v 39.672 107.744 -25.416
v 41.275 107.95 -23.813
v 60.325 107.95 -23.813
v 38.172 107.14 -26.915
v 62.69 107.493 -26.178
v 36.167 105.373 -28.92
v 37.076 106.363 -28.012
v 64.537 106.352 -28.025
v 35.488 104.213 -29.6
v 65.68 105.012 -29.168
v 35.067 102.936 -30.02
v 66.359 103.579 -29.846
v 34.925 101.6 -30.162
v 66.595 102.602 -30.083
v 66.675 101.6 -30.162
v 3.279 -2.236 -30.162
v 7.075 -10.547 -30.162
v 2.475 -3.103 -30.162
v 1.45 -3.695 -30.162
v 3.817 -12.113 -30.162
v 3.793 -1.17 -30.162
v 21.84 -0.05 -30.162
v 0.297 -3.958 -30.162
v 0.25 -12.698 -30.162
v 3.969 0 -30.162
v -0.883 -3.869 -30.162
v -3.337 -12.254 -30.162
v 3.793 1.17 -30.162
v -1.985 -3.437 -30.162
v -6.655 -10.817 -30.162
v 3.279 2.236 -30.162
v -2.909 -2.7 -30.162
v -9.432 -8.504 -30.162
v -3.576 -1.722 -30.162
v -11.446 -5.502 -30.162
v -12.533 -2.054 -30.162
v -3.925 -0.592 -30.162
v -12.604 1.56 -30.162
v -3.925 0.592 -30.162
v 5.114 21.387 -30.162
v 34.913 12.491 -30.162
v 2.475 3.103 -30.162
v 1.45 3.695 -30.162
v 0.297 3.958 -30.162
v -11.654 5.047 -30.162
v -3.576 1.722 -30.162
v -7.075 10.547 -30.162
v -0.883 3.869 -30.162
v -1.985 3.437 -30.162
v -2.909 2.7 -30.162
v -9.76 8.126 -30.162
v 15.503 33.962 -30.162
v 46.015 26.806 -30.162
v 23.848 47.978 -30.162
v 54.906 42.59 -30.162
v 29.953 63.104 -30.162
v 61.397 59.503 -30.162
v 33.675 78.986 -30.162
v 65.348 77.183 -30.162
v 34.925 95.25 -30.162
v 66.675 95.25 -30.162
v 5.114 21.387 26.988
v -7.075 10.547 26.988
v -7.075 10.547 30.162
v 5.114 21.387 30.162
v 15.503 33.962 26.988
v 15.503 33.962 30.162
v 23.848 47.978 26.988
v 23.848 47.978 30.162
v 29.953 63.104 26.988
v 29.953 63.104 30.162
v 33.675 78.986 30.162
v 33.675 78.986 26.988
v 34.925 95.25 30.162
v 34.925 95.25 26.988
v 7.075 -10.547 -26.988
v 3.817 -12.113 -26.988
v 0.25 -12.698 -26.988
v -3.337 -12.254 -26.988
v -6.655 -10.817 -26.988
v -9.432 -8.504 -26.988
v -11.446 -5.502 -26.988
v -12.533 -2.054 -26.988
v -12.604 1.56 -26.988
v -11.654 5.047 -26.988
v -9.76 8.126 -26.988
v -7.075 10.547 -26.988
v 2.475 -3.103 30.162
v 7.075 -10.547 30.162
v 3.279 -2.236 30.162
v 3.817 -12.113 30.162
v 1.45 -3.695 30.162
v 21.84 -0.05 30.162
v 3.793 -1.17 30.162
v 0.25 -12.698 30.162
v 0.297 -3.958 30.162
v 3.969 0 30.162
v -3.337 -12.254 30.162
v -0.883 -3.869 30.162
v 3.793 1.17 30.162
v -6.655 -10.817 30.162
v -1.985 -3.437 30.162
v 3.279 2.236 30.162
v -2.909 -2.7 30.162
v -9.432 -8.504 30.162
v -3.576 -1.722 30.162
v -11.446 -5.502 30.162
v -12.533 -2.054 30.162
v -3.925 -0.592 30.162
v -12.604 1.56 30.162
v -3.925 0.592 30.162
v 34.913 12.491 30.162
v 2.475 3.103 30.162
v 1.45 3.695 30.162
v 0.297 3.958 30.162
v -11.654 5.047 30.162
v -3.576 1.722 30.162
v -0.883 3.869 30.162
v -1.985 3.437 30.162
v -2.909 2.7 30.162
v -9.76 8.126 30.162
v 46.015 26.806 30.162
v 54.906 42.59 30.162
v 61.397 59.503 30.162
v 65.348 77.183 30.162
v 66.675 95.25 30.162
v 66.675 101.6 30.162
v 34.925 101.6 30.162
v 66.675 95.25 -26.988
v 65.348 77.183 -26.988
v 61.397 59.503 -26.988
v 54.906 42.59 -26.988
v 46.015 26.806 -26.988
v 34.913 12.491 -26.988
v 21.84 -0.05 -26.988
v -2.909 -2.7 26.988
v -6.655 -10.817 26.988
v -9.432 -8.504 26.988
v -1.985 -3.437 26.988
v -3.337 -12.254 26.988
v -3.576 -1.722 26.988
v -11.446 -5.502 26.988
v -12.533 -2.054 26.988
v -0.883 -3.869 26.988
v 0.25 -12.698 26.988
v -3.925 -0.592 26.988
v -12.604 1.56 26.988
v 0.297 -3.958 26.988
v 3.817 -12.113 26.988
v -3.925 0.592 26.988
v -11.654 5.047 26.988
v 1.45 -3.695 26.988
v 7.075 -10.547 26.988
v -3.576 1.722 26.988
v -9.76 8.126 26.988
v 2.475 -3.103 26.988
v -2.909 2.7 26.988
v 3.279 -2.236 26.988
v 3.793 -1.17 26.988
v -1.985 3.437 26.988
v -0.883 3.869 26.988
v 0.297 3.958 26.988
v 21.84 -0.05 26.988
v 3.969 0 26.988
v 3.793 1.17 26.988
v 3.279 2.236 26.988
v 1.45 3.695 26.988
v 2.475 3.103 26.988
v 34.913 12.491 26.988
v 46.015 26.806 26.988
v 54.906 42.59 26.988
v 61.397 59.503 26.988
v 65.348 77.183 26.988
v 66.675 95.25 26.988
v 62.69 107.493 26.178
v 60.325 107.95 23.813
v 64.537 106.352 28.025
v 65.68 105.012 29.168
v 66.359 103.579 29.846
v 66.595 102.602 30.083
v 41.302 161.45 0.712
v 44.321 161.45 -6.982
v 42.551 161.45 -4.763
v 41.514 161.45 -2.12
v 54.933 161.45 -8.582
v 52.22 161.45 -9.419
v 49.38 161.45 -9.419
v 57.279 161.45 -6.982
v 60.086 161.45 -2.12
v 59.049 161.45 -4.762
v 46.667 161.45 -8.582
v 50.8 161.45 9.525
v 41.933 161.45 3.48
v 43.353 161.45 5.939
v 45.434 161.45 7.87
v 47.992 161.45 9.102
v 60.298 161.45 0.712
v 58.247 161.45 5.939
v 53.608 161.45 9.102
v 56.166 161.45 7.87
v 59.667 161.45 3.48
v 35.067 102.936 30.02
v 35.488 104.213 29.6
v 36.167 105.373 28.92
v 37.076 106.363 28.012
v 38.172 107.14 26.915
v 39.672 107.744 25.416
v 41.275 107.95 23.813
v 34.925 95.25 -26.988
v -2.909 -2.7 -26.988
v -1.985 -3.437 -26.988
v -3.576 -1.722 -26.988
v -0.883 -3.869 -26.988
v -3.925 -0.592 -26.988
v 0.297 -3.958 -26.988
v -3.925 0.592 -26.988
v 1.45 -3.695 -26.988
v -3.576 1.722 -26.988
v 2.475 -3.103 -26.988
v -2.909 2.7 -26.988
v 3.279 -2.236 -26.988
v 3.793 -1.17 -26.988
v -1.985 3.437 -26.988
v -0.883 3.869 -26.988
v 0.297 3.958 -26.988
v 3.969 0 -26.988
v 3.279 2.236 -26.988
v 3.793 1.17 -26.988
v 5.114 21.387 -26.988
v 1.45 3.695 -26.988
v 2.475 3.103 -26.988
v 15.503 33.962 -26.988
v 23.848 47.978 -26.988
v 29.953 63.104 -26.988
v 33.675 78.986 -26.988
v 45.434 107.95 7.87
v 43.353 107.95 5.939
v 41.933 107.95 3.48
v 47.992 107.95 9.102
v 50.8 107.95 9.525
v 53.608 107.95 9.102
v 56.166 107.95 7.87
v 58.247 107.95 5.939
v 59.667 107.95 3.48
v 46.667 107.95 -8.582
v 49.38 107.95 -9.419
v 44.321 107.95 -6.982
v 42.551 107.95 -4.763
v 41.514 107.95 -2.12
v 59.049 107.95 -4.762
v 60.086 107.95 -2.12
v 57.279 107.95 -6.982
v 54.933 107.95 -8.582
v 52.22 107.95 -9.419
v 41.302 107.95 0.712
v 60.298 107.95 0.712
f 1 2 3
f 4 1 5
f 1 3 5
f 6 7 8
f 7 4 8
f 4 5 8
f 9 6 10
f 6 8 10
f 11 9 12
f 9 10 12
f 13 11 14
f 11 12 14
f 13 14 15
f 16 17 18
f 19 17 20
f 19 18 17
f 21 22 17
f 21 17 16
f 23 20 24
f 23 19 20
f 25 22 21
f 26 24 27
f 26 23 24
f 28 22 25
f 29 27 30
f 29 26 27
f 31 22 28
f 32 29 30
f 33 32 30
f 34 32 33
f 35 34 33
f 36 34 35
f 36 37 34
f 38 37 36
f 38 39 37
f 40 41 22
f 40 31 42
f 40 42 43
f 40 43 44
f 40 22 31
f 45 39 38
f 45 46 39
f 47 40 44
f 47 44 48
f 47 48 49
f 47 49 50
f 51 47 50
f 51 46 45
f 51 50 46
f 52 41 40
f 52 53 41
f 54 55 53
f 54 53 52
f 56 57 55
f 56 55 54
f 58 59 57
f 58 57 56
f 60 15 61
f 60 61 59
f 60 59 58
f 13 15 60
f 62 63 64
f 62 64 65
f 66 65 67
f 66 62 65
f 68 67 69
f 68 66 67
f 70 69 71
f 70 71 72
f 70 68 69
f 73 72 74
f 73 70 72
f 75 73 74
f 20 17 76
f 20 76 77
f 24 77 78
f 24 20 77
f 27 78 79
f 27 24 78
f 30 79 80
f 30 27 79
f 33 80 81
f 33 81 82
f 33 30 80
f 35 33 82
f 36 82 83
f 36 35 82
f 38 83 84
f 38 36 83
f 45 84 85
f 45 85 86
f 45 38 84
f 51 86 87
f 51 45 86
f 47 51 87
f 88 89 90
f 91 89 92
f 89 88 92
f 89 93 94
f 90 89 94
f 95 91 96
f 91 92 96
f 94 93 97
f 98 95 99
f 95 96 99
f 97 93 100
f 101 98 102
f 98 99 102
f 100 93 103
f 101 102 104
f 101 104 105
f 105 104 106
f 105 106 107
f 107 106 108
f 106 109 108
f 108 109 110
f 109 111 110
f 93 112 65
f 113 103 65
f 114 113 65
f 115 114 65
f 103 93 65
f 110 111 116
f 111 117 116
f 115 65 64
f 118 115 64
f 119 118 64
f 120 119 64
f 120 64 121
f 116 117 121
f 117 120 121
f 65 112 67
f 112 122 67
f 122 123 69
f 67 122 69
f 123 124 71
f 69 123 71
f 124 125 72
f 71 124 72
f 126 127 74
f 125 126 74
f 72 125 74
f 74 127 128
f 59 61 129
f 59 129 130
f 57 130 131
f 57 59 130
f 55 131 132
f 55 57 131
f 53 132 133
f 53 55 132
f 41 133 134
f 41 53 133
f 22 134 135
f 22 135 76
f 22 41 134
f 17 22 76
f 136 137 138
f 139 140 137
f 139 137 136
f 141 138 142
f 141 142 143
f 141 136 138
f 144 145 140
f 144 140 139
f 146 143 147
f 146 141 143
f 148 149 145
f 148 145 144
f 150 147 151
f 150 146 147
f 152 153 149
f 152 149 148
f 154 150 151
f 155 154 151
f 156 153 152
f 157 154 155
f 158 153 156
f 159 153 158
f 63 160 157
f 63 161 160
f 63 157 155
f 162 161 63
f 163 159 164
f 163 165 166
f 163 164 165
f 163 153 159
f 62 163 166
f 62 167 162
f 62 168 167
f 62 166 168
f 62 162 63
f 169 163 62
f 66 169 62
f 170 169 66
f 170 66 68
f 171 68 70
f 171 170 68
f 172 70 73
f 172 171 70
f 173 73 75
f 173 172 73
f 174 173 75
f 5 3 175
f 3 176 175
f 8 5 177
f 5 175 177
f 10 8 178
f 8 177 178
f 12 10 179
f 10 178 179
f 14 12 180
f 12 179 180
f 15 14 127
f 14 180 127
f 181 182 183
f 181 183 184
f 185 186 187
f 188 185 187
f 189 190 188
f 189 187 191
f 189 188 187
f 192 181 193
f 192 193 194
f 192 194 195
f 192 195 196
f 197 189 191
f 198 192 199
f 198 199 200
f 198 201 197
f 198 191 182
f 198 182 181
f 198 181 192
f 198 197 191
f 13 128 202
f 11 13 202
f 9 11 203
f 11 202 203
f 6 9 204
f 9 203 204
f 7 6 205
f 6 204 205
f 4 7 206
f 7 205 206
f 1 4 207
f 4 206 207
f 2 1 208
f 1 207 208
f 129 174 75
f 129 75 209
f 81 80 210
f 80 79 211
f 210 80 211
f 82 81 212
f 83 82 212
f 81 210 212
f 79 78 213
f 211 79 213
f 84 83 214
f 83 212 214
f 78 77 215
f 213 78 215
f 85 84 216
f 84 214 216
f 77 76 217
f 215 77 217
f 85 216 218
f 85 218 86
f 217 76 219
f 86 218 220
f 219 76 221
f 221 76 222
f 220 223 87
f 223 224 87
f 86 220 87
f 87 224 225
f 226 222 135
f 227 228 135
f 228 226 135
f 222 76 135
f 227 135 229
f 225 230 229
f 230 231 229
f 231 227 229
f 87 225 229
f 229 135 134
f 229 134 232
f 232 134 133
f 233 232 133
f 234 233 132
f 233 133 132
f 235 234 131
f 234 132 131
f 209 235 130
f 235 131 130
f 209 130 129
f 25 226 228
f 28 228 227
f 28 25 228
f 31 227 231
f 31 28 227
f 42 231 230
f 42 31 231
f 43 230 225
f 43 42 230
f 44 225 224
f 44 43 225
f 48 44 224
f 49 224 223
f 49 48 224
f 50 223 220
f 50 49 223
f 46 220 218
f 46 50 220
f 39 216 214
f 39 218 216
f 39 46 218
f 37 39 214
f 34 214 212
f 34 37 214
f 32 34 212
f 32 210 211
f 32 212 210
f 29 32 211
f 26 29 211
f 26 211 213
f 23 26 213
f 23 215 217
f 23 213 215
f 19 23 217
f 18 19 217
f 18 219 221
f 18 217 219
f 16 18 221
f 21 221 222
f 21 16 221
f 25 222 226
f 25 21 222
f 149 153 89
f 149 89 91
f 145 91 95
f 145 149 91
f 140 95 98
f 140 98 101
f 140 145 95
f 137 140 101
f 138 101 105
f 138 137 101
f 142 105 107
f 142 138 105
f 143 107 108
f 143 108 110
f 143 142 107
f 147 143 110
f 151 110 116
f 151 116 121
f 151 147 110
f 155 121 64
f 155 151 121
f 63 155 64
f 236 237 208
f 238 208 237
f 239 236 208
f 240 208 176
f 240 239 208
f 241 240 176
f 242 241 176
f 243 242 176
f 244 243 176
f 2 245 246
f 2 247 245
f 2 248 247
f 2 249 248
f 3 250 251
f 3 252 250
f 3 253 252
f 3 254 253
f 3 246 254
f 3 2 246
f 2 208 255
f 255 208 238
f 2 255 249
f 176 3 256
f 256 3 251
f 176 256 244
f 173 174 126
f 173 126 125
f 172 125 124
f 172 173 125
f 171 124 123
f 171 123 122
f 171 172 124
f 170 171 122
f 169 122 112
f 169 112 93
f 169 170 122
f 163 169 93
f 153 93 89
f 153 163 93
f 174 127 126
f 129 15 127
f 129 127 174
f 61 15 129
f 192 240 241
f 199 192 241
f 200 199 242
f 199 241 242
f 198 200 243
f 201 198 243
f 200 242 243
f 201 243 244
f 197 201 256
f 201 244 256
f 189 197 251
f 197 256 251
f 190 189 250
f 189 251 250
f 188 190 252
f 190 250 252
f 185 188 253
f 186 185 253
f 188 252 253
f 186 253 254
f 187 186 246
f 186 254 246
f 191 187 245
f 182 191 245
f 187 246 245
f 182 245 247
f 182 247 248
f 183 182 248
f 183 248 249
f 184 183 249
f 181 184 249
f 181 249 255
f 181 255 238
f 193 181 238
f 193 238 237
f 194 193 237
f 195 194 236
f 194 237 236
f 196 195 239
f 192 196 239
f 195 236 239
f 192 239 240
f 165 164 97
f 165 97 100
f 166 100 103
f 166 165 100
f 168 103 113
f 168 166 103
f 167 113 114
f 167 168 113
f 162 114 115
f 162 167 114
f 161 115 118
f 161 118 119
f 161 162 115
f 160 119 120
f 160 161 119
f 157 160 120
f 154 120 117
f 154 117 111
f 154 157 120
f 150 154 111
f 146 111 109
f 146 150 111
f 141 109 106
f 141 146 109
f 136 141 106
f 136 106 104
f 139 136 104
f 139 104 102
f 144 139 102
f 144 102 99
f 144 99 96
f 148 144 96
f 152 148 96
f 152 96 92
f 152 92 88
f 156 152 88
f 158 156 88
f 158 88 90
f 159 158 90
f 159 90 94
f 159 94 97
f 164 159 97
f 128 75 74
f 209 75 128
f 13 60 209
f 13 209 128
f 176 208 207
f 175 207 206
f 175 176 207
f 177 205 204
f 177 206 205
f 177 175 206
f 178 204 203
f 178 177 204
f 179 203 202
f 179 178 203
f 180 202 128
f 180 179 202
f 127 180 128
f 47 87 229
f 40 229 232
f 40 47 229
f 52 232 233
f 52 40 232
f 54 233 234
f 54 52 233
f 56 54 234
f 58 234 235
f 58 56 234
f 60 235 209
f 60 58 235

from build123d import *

# Parameters (mm, degrees)
SALIENTE_EXTRUIR1_DEPTH      = 30.1625
SALIENTE_EXTRUIR1_DEPTH_BACK = 30.1625
CROQUIS1_R                   = 3.969
CROQUIS2_W                   = 53.975
CROQUIS2_H                   = 127
CORTAR_EXTRUIR1_DEPTH        = 138.343982508
CROQUIS3_R                   = 9.525
SALIENTE_EXTRUIR2_DEPTH      = 53.5
REDONDEO1_R                  = 6.35


with BuildPart() as part:
    # Croquis1 → Saliente-Extruir1 (new, two sides: drawn at the far end of the back side and taken through both)
    with BuildSketch(Plane.XY.offset(-SALIENTE_EXTRUIR1_DEPTH_BACK)):
        with BuildLine():
            Line((34.925, 95.25), (34.925, 107.95))
            Line((34.925, 107.95), (66.675, 107.95))
            Line((66.675, 107.95), (66.675, 95.25))
            ThreePointArc((66.675, 95.25), (50.749935163, 34.535310409), (7.075086505, -10.546712803))
            ThreePointArc((7.075086505, -10.546712803), (-10.546712803, -7.075086505), (-7.075086505, 10.546712803))
            ThreePointArc((-7.075086505, 10.546712803), (23.848499799, 47.977772084), (34.925, 95.25))
        make_face()
        Circle(CROQUIS1_R, mode=Mode.SUBTRACT)
    extrude(amount=SALIENTE_EXTRUIR1_DEPTH + SALIENTE_EXTRUIR1_DEPTH_BACK)

    # Croquis2 → Cortar-Extruir1 (cut, through all)
    with BuildSketch(Plane(origin=(66.675, 0, 0), x_dir=(0, 0, -1), z_dir=(1, 0, 0))):
        with Locations((0, 31.75)):
            Rectangle(CROQUIS2_W, CROQUIS2_H)
    extrude(amount=-CORTAR_EXTRUIR1_DEPTH, mode=Mode.SUBTRACT)

    # Croquis3 → Saliente-Extruir2 (add)
    with BuildSketch(Plane(origin=(0, 107.95, 0), x_dir=(1, 0, 0), z_dir=(0, 1, 0))):
        with Locations(Location((50.8, 0, 0), (0, 0, 270))):
            Circle(CROQUIS3_R)
    extrude(amount=SALIENTE_EXTRUIR2_DEPTH)

    # Redondeo1
    redondeo1_edges = [part.edges().sort_by_distance(p)[0] for p in [
        (34.925, 107.95, 0),
        (66.675, 107.95, 0),
        (50.8, 107.95, 30.1625),
        (50.8, 107.95, -30.1625),
    ]]
    fillet(redondeo1_edges, radius=REDONDEO1_R)


solid = part.part
